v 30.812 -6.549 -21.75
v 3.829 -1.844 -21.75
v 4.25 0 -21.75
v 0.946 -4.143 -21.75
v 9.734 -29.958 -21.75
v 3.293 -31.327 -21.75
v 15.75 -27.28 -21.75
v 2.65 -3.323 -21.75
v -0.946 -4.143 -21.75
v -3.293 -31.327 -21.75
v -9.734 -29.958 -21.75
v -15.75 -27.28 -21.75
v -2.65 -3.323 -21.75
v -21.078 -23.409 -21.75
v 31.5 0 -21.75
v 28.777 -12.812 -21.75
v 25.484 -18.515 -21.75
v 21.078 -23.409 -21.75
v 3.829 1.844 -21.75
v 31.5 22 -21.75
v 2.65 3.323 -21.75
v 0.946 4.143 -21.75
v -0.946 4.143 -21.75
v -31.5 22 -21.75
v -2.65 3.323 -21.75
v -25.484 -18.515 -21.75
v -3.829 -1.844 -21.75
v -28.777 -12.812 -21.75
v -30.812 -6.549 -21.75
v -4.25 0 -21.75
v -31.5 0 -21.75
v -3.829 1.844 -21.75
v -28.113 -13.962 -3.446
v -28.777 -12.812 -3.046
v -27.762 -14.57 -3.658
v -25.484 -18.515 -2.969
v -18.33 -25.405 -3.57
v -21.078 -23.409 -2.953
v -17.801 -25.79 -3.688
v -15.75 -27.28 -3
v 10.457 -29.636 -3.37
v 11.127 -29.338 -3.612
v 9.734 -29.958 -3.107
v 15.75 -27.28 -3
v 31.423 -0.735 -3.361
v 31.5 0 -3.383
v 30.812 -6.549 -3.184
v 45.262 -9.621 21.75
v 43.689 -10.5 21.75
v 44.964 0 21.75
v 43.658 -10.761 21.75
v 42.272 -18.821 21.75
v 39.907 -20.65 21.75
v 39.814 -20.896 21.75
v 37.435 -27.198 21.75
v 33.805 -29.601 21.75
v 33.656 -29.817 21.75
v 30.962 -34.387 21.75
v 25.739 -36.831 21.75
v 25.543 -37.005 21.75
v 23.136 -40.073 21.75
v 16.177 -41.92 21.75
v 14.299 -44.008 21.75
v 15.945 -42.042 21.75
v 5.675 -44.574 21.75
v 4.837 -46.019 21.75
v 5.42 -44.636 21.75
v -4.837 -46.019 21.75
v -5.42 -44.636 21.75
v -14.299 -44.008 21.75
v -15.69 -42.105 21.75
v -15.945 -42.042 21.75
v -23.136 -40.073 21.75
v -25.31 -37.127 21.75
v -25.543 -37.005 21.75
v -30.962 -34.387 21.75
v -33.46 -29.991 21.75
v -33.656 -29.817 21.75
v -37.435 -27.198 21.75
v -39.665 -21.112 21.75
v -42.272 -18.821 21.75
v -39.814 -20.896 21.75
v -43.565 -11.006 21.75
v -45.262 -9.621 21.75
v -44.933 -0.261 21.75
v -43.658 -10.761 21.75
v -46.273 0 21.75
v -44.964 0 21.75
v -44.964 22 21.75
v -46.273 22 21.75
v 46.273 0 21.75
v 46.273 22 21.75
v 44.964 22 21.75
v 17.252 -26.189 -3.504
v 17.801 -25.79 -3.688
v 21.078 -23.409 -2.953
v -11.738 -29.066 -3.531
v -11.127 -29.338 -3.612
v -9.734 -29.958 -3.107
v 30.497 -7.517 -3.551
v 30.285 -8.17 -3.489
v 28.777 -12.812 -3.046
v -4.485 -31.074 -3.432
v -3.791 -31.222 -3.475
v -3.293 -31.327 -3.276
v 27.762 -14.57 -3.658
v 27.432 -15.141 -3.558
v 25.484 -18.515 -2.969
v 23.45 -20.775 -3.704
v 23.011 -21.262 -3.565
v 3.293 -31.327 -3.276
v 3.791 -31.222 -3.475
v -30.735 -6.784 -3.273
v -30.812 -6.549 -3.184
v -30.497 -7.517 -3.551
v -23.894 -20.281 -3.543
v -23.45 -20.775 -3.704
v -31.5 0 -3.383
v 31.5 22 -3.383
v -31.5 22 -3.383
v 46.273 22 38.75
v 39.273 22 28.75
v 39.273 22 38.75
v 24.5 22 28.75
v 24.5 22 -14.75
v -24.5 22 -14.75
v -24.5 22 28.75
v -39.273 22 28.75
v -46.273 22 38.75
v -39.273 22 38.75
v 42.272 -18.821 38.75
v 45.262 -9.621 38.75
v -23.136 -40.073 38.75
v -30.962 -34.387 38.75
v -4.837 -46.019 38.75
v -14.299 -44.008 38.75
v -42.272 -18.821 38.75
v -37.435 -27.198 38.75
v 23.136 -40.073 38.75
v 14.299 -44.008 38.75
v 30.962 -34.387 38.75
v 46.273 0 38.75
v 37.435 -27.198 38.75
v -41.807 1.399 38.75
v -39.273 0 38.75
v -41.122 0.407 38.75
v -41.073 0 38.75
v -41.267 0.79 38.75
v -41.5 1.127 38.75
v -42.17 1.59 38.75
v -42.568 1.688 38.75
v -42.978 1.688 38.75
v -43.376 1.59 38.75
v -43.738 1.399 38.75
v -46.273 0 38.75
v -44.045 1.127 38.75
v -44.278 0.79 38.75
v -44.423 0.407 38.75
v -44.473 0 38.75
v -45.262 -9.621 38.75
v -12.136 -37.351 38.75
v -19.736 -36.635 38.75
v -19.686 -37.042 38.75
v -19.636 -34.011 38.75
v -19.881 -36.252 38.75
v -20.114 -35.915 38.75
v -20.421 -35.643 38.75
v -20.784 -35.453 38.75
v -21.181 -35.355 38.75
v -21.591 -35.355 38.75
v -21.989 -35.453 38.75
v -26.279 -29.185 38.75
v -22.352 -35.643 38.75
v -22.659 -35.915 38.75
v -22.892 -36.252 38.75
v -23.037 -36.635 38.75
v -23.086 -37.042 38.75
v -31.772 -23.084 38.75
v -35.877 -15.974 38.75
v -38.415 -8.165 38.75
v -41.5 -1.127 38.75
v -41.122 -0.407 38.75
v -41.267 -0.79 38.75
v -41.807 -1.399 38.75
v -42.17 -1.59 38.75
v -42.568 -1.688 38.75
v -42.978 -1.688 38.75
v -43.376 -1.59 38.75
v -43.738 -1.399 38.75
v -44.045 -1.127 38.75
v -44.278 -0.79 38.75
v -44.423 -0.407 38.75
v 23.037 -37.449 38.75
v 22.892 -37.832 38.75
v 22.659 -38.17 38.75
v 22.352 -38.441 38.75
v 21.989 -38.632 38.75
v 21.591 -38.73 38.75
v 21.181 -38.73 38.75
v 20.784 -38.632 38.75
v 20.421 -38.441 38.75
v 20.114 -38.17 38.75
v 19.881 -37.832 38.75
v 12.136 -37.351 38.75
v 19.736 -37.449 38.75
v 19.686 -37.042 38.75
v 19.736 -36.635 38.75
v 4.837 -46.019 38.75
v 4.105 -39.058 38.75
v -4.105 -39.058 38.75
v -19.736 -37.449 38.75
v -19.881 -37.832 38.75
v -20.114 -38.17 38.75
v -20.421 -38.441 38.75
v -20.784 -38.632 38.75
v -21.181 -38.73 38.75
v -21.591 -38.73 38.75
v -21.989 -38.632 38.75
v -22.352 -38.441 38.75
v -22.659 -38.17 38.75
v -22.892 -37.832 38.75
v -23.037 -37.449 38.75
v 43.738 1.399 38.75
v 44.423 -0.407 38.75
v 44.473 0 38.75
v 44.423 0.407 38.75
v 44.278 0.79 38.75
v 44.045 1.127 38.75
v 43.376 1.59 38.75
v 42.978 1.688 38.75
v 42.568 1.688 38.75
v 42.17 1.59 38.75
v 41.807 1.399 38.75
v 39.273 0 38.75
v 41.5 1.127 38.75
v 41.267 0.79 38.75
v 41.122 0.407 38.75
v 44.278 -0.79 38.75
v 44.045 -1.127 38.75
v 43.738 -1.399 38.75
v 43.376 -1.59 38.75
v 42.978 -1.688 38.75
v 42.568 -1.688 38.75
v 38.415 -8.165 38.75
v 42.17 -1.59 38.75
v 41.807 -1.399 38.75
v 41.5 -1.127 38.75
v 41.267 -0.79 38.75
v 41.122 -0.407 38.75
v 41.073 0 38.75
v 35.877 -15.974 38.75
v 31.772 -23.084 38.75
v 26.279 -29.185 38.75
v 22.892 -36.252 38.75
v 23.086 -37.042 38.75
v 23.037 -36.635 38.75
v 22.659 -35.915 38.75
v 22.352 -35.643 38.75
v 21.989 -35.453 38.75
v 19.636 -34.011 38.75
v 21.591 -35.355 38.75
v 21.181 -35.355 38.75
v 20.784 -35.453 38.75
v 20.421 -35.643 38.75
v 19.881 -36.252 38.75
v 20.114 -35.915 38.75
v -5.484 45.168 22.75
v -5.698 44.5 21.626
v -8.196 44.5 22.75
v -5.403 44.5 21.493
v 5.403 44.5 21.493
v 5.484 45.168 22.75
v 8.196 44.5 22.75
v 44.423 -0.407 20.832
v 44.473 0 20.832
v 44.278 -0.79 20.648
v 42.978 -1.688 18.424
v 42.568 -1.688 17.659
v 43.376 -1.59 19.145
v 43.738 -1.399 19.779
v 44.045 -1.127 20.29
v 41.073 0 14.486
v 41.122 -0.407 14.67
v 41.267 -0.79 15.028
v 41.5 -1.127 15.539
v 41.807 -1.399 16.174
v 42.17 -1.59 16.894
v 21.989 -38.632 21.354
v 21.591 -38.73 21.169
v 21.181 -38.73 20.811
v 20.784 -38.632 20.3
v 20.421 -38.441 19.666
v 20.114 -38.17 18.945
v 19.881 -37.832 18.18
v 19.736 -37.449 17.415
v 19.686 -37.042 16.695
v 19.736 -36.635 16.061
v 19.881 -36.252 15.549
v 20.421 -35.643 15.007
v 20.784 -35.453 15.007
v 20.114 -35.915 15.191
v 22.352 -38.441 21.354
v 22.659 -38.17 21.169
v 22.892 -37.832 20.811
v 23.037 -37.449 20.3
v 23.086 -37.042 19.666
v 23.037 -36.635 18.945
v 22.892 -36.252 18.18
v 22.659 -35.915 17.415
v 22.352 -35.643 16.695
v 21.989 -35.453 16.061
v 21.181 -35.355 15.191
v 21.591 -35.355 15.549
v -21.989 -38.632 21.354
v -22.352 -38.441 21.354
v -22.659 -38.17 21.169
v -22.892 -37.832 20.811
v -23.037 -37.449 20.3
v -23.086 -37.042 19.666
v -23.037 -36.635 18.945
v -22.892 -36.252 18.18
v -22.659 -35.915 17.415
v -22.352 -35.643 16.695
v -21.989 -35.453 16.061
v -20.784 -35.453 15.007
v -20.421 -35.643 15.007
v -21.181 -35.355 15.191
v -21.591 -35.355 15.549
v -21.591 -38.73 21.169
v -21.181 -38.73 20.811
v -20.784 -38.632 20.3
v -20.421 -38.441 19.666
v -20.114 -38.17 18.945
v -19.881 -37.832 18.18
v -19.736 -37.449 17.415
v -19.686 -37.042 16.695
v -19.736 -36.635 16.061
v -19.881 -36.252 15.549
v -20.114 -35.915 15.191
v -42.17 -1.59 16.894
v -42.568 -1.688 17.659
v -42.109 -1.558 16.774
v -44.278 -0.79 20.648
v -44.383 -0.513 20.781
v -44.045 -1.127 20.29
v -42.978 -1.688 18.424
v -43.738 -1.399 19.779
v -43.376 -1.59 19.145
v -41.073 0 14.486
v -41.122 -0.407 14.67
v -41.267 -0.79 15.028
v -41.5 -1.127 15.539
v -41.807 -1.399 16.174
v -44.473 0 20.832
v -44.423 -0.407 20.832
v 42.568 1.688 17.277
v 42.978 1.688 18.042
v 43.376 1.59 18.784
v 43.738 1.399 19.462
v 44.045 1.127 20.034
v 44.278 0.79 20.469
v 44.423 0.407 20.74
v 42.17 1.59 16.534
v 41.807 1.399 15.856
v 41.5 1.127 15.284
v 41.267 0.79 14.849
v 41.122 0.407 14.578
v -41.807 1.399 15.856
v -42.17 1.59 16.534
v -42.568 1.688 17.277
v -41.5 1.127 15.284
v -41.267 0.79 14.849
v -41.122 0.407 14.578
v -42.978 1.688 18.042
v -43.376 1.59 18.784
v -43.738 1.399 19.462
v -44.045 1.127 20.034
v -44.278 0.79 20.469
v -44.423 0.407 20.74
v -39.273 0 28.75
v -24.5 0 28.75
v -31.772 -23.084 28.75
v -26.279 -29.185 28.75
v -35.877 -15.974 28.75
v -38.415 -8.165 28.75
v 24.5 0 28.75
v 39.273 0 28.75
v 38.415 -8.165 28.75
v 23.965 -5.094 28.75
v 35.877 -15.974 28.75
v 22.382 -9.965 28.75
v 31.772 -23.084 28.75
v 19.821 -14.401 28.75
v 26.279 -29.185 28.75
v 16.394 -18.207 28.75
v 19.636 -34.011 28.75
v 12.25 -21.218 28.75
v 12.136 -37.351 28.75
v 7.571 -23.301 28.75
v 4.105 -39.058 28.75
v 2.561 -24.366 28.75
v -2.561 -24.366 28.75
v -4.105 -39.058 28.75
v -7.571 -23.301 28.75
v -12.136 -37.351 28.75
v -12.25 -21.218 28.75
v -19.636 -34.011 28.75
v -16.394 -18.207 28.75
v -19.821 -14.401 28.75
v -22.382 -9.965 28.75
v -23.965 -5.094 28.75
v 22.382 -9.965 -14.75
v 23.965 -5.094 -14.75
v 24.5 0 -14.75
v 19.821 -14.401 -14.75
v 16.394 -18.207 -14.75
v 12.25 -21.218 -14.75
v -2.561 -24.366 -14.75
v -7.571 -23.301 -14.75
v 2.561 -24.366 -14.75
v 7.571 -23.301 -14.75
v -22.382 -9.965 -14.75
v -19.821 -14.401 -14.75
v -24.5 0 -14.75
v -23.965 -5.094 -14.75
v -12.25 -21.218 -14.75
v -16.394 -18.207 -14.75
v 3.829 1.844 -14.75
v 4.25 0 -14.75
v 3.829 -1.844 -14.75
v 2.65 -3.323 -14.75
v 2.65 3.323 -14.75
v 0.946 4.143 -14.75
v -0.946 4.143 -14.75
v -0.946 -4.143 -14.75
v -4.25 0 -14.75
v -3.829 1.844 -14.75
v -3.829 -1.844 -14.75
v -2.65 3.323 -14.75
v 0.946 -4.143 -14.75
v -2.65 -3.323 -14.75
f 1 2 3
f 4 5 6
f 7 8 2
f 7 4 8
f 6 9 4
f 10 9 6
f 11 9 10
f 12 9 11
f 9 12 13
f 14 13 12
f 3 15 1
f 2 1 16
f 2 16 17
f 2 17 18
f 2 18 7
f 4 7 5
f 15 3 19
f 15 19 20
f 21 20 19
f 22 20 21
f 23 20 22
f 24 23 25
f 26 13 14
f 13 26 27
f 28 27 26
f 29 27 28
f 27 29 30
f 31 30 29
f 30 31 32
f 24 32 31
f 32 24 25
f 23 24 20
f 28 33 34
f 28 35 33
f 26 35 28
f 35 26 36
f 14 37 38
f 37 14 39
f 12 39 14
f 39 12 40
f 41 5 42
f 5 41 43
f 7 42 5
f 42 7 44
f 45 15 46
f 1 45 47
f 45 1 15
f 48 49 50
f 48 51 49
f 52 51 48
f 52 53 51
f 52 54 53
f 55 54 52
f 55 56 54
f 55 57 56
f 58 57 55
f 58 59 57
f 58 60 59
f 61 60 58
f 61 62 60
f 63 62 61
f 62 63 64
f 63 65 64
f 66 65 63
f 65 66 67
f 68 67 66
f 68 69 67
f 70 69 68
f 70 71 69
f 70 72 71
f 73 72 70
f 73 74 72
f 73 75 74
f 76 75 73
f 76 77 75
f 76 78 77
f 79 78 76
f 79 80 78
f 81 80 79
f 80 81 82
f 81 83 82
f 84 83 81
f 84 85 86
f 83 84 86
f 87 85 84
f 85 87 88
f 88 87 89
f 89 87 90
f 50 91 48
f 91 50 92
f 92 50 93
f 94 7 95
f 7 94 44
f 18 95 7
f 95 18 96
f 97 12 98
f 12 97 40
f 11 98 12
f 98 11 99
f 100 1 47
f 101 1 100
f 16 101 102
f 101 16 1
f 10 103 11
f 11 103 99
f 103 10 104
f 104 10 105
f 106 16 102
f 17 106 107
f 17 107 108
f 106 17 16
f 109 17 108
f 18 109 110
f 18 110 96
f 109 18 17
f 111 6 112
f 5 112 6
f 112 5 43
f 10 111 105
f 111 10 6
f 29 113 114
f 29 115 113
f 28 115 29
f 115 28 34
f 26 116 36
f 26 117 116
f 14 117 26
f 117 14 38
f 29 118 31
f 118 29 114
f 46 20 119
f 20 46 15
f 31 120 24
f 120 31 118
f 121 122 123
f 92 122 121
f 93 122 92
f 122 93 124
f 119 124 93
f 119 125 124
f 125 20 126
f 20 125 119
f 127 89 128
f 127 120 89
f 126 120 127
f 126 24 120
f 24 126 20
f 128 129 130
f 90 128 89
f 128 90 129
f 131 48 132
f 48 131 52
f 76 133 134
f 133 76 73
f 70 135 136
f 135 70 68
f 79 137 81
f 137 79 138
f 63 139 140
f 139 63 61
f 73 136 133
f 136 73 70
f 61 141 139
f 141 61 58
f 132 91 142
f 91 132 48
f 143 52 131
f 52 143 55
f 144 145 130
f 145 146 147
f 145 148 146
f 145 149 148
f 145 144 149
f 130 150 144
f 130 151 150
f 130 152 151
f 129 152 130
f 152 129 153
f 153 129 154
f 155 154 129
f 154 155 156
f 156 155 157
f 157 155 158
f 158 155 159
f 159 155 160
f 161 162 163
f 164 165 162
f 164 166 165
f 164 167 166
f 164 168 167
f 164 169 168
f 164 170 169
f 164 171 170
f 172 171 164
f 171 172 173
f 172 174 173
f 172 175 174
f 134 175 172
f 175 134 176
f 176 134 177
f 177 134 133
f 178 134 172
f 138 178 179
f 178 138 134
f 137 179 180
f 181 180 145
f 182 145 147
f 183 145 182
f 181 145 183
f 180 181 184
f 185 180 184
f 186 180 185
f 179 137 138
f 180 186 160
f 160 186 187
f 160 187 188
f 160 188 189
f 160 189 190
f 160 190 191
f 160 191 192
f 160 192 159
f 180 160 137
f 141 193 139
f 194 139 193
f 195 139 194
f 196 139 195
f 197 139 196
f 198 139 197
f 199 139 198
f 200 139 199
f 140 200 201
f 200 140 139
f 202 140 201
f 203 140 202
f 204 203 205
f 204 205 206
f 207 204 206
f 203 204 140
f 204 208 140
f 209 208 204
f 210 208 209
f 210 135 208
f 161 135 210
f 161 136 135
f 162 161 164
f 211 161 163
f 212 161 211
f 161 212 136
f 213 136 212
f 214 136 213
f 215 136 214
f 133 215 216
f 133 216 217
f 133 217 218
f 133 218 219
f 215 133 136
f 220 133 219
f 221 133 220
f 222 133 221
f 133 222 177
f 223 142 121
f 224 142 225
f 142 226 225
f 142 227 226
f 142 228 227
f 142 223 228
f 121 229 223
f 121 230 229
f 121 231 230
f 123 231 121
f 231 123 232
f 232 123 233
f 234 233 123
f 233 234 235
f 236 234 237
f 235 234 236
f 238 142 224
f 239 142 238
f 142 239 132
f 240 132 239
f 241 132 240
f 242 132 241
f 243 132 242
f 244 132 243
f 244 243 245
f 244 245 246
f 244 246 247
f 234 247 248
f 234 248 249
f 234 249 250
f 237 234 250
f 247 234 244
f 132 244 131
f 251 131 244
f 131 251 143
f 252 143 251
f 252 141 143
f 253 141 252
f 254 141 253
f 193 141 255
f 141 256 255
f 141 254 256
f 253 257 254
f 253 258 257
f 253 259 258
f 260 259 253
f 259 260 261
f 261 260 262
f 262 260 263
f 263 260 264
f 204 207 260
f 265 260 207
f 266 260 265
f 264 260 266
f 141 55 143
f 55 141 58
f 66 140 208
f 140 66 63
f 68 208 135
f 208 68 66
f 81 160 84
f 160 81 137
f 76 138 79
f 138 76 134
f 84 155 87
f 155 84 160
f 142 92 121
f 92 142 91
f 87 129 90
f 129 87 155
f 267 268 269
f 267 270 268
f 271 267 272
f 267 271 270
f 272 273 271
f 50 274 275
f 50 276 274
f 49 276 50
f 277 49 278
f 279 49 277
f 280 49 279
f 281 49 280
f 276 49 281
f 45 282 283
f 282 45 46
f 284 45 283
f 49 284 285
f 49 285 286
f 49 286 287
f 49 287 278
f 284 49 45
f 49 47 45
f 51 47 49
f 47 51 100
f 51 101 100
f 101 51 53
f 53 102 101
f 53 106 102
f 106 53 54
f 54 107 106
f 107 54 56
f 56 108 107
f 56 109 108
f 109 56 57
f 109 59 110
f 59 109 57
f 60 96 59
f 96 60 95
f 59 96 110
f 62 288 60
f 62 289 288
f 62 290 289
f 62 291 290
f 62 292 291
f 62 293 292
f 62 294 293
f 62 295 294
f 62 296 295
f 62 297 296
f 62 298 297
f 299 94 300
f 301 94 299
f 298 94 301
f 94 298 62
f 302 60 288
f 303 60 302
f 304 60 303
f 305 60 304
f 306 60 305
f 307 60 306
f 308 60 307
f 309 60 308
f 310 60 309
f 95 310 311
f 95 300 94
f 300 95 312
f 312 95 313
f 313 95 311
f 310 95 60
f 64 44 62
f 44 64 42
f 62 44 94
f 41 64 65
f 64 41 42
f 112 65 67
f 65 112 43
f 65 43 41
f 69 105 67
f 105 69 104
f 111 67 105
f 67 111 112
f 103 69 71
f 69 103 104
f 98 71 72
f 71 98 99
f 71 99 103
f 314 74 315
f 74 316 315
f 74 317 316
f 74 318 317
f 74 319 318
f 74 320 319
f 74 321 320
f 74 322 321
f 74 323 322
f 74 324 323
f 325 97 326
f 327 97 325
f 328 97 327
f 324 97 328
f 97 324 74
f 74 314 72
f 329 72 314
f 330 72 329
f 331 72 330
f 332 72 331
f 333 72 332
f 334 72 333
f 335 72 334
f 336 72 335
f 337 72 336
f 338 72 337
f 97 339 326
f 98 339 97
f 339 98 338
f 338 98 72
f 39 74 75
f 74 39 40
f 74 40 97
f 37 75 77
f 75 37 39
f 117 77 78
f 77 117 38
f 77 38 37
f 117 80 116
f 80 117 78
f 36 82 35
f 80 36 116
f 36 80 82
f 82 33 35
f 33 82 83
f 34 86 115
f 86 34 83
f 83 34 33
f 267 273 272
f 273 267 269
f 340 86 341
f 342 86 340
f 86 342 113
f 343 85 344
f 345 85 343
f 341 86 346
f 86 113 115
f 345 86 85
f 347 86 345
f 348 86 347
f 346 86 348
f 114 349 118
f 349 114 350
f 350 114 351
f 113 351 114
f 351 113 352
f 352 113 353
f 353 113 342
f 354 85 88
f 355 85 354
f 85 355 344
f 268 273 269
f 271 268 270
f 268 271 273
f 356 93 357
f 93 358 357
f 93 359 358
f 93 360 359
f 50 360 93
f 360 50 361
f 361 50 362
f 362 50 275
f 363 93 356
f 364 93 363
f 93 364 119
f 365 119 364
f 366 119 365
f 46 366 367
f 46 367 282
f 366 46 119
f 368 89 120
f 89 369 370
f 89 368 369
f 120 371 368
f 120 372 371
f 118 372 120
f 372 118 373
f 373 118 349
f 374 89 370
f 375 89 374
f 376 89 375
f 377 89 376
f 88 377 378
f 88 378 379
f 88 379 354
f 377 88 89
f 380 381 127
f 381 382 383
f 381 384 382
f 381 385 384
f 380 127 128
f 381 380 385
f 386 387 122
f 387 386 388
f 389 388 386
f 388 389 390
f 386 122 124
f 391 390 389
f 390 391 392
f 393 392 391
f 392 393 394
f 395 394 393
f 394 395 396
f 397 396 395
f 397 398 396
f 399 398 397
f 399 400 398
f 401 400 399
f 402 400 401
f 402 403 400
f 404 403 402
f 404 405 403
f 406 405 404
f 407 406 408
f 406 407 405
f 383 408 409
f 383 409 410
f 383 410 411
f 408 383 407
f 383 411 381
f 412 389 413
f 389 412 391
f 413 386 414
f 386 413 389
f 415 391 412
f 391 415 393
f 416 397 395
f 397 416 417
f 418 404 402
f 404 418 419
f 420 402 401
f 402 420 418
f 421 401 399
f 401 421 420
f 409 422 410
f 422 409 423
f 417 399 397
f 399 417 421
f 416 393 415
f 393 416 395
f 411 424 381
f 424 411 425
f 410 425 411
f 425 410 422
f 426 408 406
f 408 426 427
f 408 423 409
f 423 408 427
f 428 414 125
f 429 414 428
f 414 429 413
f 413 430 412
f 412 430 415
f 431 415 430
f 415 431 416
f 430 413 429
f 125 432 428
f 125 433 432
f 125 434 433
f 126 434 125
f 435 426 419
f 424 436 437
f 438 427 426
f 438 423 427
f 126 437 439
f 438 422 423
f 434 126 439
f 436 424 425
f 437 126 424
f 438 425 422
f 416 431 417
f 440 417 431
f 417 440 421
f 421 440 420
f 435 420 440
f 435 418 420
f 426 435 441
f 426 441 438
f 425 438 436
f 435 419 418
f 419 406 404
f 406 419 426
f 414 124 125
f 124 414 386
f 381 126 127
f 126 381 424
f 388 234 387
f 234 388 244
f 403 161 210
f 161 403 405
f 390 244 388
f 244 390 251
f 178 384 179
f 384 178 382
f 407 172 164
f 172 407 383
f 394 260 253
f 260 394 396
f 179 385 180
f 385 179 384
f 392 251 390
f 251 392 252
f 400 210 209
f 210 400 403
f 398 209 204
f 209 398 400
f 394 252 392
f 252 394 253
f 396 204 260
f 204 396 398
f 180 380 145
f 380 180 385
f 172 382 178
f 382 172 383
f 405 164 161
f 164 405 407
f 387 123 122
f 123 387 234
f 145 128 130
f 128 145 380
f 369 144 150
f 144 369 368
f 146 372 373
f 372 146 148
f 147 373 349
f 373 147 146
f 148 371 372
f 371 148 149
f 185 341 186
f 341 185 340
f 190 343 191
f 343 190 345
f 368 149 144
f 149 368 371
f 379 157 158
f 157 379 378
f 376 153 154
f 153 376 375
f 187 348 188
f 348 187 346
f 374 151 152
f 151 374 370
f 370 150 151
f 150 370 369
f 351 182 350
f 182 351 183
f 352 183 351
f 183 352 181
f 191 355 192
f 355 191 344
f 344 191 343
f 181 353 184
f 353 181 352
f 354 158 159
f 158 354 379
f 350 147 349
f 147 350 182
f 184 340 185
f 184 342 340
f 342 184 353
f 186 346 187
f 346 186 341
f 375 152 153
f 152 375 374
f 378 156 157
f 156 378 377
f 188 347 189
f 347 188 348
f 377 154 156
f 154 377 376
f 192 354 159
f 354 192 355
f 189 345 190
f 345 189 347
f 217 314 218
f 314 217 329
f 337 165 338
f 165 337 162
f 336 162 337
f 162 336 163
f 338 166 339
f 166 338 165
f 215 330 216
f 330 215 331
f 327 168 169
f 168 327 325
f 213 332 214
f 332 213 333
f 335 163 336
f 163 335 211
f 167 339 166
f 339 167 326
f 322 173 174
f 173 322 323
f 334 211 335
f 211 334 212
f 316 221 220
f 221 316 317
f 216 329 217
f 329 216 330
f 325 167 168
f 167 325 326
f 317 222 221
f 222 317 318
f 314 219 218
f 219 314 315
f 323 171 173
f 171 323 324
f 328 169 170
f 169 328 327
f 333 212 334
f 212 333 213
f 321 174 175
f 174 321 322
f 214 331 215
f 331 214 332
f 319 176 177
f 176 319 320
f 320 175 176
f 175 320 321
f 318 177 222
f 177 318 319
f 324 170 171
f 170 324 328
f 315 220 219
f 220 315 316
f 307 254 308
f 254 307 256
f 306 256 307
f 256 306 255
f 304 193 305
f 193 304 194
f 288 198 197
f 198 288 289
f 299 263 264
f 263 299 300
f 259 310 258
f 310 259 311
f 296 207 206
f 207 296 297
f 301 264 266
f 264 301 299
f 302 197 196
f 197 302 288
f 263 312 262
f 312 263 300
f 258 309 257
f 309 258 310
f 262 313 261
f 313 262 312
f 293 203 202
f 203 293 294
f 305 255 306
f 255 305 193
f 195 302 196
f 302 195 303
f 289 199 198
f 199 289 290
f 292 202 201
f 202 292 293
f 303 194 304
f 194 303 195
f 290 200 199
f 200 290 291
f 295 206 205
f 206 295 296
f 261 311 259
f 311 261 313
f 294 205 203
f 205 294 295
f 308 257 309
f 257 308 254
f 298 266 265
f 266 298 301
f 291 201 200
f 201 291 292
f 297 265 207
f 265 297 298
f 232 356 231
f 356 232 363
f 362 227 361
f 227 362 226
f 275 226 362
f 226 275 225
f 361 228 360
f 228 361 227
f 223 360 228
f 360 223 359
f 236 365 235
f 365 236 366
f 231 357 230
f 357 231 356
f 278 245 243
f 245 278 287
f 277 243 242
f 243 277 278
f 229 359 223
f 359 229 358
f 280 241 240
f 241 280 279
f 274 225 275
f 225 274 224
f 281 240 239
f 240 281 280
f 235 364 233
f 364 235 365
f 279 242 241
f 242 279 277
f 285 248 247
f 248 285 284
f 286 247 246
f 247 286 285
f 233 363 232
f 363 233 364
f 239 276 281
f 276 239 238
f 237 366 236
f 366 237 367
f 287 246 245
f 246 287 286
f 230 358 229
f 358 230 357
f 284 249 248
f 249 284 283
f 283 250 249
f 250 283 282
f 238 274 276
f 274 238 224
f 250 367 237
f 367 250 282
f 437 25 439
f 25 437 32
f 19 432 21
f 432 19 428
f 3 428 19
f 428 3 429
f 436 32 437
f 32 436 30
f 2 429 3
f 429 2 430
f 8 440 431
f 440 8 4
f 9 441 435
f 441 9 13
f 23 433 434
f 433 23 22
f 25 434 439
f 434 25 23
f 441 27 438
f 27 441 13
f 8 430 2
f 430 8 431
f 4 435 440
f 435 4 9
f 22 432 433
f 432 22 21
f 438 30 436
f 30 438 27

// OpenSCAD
// file: gear_peristaltic.scad
/******************************************************/
/* PLYUMP                                             */
/* file: gear_peristaltic.scad                        */
/* author: Luis Rodriguez                             */
/* version: 0.32                                      */
/* w3b: tiny.cc/lyu                                   */
/* info:                                              */
/******************************************************/

include <parameters.scad>
use <involute_gears.scad>

// Testing
gear_peristaltic();

/* MODULES */

module gear_peristaltic(){
	difference(){
		union(){ // Add
			half_gear_peristaltic();
			mirror([0,0,1])
			half_gear_peristaltic();
		}
		union(){ // Substract
			central_bearings();
			rollers_shafts();
		}
	}
}

// Half herringbone peristaltic gear
module half_gear_peristaltic(){
	gear (number_of_teeth=gear_peristaltic_teeth,
		circular_pitch=circular_pitch,
		pressure_angle=pressure_angle,
		gear_thickness = gear_peristaltic_thickness/2,
		rim_thickness = gear_peristaltic_thickness/2,
		hub_thickness = 0,
		twist=twist/gear_peristaltic_teeth);
}

module central_bearings(){
	cylinder(r=(608zz_outside_diameter+bearings_clearance)/2, h=608zz_thickness*4, $fn = birthday_day, center=true);
}

module rollers_shafts(){
	for ( i = [ 1 : rollers_number ] ) {
		translate( [ rollers_position_minimum_radius * cos( rollers_angle * i ), 
			rollers_position_minimum_radius * sin( rollers_angle * i ),  
			0])
		cylinder( r = rollers_shaft_diameter/2 , h = 608zz_thickness*4, $fn = birthday_day , center=true);
	}
}
// file: parameters.scad
/******************************************************/
/* PLYUMP                                             */
/* file: parameters.scad                              */
/* author: Luis Rodriguez                             */
/* version: 0.32                                      */
/* w3b: tiny.cc/lyu                                   */
/* info: This file contains all the shared parameters */
/******************************************************/

birthday_day = 26;

/* Bearings dimensions (mm) */
bearings_clearance = 0.5; 	// Used to "easily fit bearings into their holes"
// 608zz id=8 od=22 thickness=7
608zz_inside_diameter = 8;
608zz_outside_diameter = 22;
608zz_thickness = 7;

// 624zz id=4 od=13 thickness=5
624zz_inside_diameter = 4;
624zz_outside_diameter = 13;
624zz_thickness = 5;

/* NEMA 17 */
nema_17_height = 42.2;
nema_17_screw_distance = 31.04;
nema_rollers_clearance = 3;

/* ROLLERS */
rollers_number = 6;
rollers_clearance = 4;
rollers_angle = 360 / ( rollers_number );
rollers_wall = 0;
rollers_diameter = 624zz_outside_diameter + rollers_wall * 2;
rollers_radius = rollers_diameter / 2;
rollers_shaft_diameter = 624zz_inside_diameter + bearings_clearance;
rollers_bearings_contacts_thickness = 2;
rollers_bearings_contacts_height = 3;

rollers_width = 624zz_thickness * 5;
rollers_easy_printing_inverted_cone_thickness = 624zz_thickness;

rollers_holder_thickness = 624zz_thickness/2;
rollers_holder_central_bearing_support_thickness = 3;
rollers_holder_central_bearing_support_height = 624zz_thickness;

rollers_radius_plus_clearance = rollers_radius + rollers_clearance / 2;
rollers_position_minimum_radius_minus_roller_radius = ( rollers_radius_plus_clearance - sin( rollers_angle / 2 ) 
	* rollers_radius_plus_clearance ) / sin( rollers_angle / 2 ) ;

if ( rollers_position_minimum_radius_minus_roller_radius < 608zz_inside_diameter) {

	echo(str(" THE ROLLERS WILL CRASH THE CENTRAL SHAFT, change the rollers_position_minimum_radius; " ) );
}

//rollers_position_minimum_radius = 608zz_inside_diameter + rollers_radius;
rollers_position_minimum_radius = rollers_position_minimum_radius_minus_roller_radius + rollers_radius;
echo(str("Rollers position radius = ", rollers_position_minimum_radius ) );

rollers_exterior_radius = rollers_position_minimum_radius + rollers_radius;
echo(str("Rollers exterior radius = ", rollers_exterior_radius ) );

/* Gears */
// Common
gear_ratio = 3;
gear_motor_teeth = 11;
gear_peristaltic_teeth = gear_ratio*gear_motor_teeth;
gear_peristaltic_thickness = 608zz_thickness * 2; // "*2" due to herringbone!

// Circular pitch is calculate through pitch radius for peristaltic and motor gear
// in order to avoid rollers crashing nema 17 motor
//
// 		nema_17_height + rollers_position_minimum_radius + rollers_radius + nema_rollers_clearance = 
// 		gear_peristaltic_pitch_radius + gear_motor_pitch_radius
//
//		gear_peristaltic_pitch_radius + gear_motor_pitch_radius =
//		gear_peristaltic_teeth * circular_pitch / 360 + gear_motor_teeth * circular_pitch / 360 =
//		(gear_peristaltic_teeth + gear_motor_teeth)/360 * circular_pitch
//
//		circular_pitch = 
//		360*(nema_17_height + rollers_position_minimum_radius + rollers_radius + nema_rollers_clearance) /
//		(gear_peristaltic_teeth + gear_motor_teeth)	

//circular_pitch = 360*gear_peristaltic_radius/gear_peristaltic_teeth;
circular_pitch = 360 * (nema_17_height/2 + rollers_position_minimum_radius + rollers_radius + nema_rollers_clearance) /
		(gear_peristaltic_teeth + gear_motor_teeth);

// Pitch diameter: Diameter of pitch circle.
gear_peristaltic_pitch_diameter = gear_peristaltic_teeth * circular_pitch / 180;
gear_peristaltic_pitch_radius = gear_peristaltic_pitch_diameter/2;
echo(str("Pitch radius gear peristaltic= ",gear_peristaltic_pitch_radius));
// Diametrial pitch: Number of teeth per unit length.
gear_peristaltic_pitch_diametrial = gear_peristaltic_teeth / gear_peristaltic_pitch_diameter;
// Addendum: Radial distance from pitch circle to outside circle.
gear_peristaltic_addendum = 1/gear_peristaltic_pitch_diametrial;
//Outer Circle
gear_peristaltic_outside_radius = gear_peristaltic_pitch_radius+gear_peristaltic_addendum;
echo(str("Outside radius gear peristaltic= ",gear_peristaltic_outside_radius));

gear_motor_height = 8;
gear_motor_neck_height = 10;
gear_motor_neck_diameter = 18;
gear_motor_thickness = 608zz_thickness * 2; // "*2" due to herringbone!
gear_motor_shaft_diameter = 5.5;

// Pitch diameter: Diameter of pitch circle.
gear_motor_pitch_diameter = gear_motor_teeth * circular_pitch / 180;
gear_motor_pitch_radius = gear_motor_pitch_diameter/2;
echo(str("Pitch radius gear motor= ",gear_motor_pitch_radius));
// Diametrial pitch: Number of teeth per unit length.
gear_motor_pitch_diametrial = gear_motor_teeth / gear_motor_pitch_diameter;
// Addendum: Radial distance from pitch circle to outside circle.
gear_motor_addendum = 1/gear_motor_pitch_diametrial;
//Outer Circle
gear_motor_outside_radius = gear_motor_pitch_radius+gear_motor_addendum;
echo(str("Outside radius gear motor= ",gear_motor_outside_radius));

pressure_angle=30;
twist=200;

gear_motor_bolt_width = 3;
gear_motor_bolt_length = 5.8;

3mm_screw_radius = 3.4/2;

pinched_tube = 3;
// main file
/******************************************************/
/* PLYUMP                                             */
/* file: pump_body.scad                               */
/* author: Luis Rodriguez                             */
/* version: 0.32                                      */
/* w3b: tiny.cc/lyu                                   */
/* info:                                              */
/******************************************************/

include <parameters.scad>
use <gear_peristaltic.scad>

/*Base*/
pump_body_base_thickness = 7;
pump_body_lateral_thickness = pump_body_base_thickness ;//* 2; 
pump_body_base_width_clearance = 3;
pump_body_peristaltic_rotor_width = gear_peristaltic_thickness + 2 * ( rollers_width + rollers_holder_thickness + gear_motor_bolt_width) + pump_body_base_width_clearance;

// Pump body peristaltic part dimensions
pump_body_cavity_exterior_radius = rollers_exterior_radius + pinched_tube + pump_body_lateral_thickness;
echo(str("pump_body_cavity_exterior_radius = ", pump_body_cavity_exterior_radius));
pump_body_cavity_exterior_height = pump_body_base_thickness + rollers_width + rollers_holder_thickness + 3 * gear_motor_bolt_width ;

pump_body_cavity_interior_radius = rollers_exterior_radius + pinched_tube;
echo(str("pump_body_cavity_interior_radius = ", pump_body_cavity_interior_radius));
pump_body_cavity_interior_height = rollers_width + rollers_holder_thickness + 3 * gear_motor_bolt_width + pump_body_base_thickness;

// Pump body gear part dimensions
pump_body_gear_cavity_interior_radius = gear_peristaltic_outside_radius + pump_body_base_width_clearance;
echo(str("pump_body_gear_cavity_interior_radius = ", pump_body_gear_cavity_interior_radius));
pump_body_gear_cavity_interior_height = gear_peristaltic_thickness/2 + pump_body_base_width_clearance;

pump_body_gear_cavity_exterior_radius = gear_peristaltic_outside_radius + pump_body_lateral_thickness + pump_body_base_width_clearance;
echo(str("pump_body_gear_cavity_exterior_radius = ", pump_body_gear_cavity_exterior_radius));
pump_body_gear_cavity_exterior_height = gear_peristaltic_thickness/2 + pump_body_base_width_clearance + pump_body_lateral_thickness;



// Testing
//color("LimeGreen") 
//translate([0, 0, pump_body_shaft_height]) {
//	rotate([0, 90, 0]) {
//		gear_peristaltic();
//	}
//}

pump_body();
//rotate([90, 0, 0]) 
//tube_holder_free();


/* MODULES */

module pump_body(){
	difference(){
		union(){ // Add
			peristaltic_cavity_exterior();
			gear_cavity_exterior();
			easy_printing_transition();
		}
		union(){ // Subtract
			peristaltic_cavity_interior();
			gear_cavity_interior();
			central_bearing_shaft();
			screw_holders();
		}
	}
}

module peristaltic_cavity_exterior(){
	color("LimeGreen")
	lateral_shape(r = pump_body_cavity_exterior_radius, h = pump_body_cavity_exterior_height);

}

module gear_cavity_exterior(){
	color("Indigo")
	translate([0, 0, pump_body_cavity_exterior_height/2 + pump_body_gear_cavity_exterior_height/2]) 
	lateral_shape( r = pump_body_gear_cavity_exterior_radius, h = pump_body_gear_cavity_exterior_height );
}

module peristaltic_cavity_interior(){
	color("Green")
	translate([0, 0, pump_body_base_thickness/2 + pump_body_base_thickness/2]) 
	lateral_shape(r = pump_body_cavity_interior_radius, h = pump_body_cavity_interior_height);

}

module gear_cavity_interior(){
	color("Purple")
	translate([0, 0, pump_body_cavity_exterior_height/2 + pump_body_gear_cavity_exterior_height/2 + pump_body_base_thickness/2]) 
	lateral_shape( r = pump_body_gear_cavity_interior_radius, h = pump_body_gear_cavity_interior_height );
}

module central_bearing_shaft(){
	color("Peru")
	cylinder(r = (608zz_inside_diameter+bearings_clearance)/2, h = pump_body_base_thickness * 8 , center=true);
}


/* WARNING~~~ this module is d************rty as heeeeeeeeeeell loco*/
module easy_printing_transition(r = pump_body_cavity_exterior_radius -1,
								bt = 2*pump_body_base_thickness+1,
								lt = 2*pump_body_lateral_thickness ){
	color("Red")
	translate([0, 0, pump_body_cavity_exterior_height/2 +1]) 
	union(){
		difference(){
			rotate_extrude(convexity = 10, $fn = birthday_day)
			translate([r, 0, 0])
			polygon(points=[[0,0],[bt,0],[0,-2*lt]], paths=[[0,1,2]]);
			translate([0, r/2 + lt/2, -bt/2]) 
			cube(size=[r*4, r + lt, lt*4], center=true);
		}	

		translate([r, 0, 0])
		rotate([270,0,0])
		linear_extrude( height = 608zz_outside_diameter , $fn = birthday_day)
		polygon(points=[[0,0],[bt,0],[0,2*lt]], paths=[[0,1,2]]);

		mirror([1, 0, 0]) {

			translate([r, 0, 0])
			rotate([270,0,0])
			linear_extrude( height = 608zz_outside_diameter , $fn = birthday_day) 
			polygon(points=[[0,0],[bt,0],[0,2*lt]], paths=[[0,1,2]]);

		}
	}

}

module lateral_shape(r = 10, h = 5, square_length = 608zz_outside_diameter){
	union(){
		difference(){
			cylinder(r=r, h=h, center=true);
			translate([0, r/2, 0]) 
			cube(size=[r*4, r, h], center=true);
		}
		translate([0, square_length/2, 0])cube(size=[r*2, square_length, h], center=true);
	}
}

module screw_holders(){
	for ( i = [ 1 : rollers_number ] ) {
		translate( [ (pump_body_gear_cavity_interior_radius + pump_body_lateral_thickness/2) * cos( rollers_angle * i ), 
			(pump_body_gear_cavity_interior_radius + pump_body_lateral_thickness/2) * sin( rollers_angle * i ),  
			0])
		cylinder( r = 3mm_screw_radius , h = 608zz_thickness*20, $fn = birthday_day , center=true);
	}
}
